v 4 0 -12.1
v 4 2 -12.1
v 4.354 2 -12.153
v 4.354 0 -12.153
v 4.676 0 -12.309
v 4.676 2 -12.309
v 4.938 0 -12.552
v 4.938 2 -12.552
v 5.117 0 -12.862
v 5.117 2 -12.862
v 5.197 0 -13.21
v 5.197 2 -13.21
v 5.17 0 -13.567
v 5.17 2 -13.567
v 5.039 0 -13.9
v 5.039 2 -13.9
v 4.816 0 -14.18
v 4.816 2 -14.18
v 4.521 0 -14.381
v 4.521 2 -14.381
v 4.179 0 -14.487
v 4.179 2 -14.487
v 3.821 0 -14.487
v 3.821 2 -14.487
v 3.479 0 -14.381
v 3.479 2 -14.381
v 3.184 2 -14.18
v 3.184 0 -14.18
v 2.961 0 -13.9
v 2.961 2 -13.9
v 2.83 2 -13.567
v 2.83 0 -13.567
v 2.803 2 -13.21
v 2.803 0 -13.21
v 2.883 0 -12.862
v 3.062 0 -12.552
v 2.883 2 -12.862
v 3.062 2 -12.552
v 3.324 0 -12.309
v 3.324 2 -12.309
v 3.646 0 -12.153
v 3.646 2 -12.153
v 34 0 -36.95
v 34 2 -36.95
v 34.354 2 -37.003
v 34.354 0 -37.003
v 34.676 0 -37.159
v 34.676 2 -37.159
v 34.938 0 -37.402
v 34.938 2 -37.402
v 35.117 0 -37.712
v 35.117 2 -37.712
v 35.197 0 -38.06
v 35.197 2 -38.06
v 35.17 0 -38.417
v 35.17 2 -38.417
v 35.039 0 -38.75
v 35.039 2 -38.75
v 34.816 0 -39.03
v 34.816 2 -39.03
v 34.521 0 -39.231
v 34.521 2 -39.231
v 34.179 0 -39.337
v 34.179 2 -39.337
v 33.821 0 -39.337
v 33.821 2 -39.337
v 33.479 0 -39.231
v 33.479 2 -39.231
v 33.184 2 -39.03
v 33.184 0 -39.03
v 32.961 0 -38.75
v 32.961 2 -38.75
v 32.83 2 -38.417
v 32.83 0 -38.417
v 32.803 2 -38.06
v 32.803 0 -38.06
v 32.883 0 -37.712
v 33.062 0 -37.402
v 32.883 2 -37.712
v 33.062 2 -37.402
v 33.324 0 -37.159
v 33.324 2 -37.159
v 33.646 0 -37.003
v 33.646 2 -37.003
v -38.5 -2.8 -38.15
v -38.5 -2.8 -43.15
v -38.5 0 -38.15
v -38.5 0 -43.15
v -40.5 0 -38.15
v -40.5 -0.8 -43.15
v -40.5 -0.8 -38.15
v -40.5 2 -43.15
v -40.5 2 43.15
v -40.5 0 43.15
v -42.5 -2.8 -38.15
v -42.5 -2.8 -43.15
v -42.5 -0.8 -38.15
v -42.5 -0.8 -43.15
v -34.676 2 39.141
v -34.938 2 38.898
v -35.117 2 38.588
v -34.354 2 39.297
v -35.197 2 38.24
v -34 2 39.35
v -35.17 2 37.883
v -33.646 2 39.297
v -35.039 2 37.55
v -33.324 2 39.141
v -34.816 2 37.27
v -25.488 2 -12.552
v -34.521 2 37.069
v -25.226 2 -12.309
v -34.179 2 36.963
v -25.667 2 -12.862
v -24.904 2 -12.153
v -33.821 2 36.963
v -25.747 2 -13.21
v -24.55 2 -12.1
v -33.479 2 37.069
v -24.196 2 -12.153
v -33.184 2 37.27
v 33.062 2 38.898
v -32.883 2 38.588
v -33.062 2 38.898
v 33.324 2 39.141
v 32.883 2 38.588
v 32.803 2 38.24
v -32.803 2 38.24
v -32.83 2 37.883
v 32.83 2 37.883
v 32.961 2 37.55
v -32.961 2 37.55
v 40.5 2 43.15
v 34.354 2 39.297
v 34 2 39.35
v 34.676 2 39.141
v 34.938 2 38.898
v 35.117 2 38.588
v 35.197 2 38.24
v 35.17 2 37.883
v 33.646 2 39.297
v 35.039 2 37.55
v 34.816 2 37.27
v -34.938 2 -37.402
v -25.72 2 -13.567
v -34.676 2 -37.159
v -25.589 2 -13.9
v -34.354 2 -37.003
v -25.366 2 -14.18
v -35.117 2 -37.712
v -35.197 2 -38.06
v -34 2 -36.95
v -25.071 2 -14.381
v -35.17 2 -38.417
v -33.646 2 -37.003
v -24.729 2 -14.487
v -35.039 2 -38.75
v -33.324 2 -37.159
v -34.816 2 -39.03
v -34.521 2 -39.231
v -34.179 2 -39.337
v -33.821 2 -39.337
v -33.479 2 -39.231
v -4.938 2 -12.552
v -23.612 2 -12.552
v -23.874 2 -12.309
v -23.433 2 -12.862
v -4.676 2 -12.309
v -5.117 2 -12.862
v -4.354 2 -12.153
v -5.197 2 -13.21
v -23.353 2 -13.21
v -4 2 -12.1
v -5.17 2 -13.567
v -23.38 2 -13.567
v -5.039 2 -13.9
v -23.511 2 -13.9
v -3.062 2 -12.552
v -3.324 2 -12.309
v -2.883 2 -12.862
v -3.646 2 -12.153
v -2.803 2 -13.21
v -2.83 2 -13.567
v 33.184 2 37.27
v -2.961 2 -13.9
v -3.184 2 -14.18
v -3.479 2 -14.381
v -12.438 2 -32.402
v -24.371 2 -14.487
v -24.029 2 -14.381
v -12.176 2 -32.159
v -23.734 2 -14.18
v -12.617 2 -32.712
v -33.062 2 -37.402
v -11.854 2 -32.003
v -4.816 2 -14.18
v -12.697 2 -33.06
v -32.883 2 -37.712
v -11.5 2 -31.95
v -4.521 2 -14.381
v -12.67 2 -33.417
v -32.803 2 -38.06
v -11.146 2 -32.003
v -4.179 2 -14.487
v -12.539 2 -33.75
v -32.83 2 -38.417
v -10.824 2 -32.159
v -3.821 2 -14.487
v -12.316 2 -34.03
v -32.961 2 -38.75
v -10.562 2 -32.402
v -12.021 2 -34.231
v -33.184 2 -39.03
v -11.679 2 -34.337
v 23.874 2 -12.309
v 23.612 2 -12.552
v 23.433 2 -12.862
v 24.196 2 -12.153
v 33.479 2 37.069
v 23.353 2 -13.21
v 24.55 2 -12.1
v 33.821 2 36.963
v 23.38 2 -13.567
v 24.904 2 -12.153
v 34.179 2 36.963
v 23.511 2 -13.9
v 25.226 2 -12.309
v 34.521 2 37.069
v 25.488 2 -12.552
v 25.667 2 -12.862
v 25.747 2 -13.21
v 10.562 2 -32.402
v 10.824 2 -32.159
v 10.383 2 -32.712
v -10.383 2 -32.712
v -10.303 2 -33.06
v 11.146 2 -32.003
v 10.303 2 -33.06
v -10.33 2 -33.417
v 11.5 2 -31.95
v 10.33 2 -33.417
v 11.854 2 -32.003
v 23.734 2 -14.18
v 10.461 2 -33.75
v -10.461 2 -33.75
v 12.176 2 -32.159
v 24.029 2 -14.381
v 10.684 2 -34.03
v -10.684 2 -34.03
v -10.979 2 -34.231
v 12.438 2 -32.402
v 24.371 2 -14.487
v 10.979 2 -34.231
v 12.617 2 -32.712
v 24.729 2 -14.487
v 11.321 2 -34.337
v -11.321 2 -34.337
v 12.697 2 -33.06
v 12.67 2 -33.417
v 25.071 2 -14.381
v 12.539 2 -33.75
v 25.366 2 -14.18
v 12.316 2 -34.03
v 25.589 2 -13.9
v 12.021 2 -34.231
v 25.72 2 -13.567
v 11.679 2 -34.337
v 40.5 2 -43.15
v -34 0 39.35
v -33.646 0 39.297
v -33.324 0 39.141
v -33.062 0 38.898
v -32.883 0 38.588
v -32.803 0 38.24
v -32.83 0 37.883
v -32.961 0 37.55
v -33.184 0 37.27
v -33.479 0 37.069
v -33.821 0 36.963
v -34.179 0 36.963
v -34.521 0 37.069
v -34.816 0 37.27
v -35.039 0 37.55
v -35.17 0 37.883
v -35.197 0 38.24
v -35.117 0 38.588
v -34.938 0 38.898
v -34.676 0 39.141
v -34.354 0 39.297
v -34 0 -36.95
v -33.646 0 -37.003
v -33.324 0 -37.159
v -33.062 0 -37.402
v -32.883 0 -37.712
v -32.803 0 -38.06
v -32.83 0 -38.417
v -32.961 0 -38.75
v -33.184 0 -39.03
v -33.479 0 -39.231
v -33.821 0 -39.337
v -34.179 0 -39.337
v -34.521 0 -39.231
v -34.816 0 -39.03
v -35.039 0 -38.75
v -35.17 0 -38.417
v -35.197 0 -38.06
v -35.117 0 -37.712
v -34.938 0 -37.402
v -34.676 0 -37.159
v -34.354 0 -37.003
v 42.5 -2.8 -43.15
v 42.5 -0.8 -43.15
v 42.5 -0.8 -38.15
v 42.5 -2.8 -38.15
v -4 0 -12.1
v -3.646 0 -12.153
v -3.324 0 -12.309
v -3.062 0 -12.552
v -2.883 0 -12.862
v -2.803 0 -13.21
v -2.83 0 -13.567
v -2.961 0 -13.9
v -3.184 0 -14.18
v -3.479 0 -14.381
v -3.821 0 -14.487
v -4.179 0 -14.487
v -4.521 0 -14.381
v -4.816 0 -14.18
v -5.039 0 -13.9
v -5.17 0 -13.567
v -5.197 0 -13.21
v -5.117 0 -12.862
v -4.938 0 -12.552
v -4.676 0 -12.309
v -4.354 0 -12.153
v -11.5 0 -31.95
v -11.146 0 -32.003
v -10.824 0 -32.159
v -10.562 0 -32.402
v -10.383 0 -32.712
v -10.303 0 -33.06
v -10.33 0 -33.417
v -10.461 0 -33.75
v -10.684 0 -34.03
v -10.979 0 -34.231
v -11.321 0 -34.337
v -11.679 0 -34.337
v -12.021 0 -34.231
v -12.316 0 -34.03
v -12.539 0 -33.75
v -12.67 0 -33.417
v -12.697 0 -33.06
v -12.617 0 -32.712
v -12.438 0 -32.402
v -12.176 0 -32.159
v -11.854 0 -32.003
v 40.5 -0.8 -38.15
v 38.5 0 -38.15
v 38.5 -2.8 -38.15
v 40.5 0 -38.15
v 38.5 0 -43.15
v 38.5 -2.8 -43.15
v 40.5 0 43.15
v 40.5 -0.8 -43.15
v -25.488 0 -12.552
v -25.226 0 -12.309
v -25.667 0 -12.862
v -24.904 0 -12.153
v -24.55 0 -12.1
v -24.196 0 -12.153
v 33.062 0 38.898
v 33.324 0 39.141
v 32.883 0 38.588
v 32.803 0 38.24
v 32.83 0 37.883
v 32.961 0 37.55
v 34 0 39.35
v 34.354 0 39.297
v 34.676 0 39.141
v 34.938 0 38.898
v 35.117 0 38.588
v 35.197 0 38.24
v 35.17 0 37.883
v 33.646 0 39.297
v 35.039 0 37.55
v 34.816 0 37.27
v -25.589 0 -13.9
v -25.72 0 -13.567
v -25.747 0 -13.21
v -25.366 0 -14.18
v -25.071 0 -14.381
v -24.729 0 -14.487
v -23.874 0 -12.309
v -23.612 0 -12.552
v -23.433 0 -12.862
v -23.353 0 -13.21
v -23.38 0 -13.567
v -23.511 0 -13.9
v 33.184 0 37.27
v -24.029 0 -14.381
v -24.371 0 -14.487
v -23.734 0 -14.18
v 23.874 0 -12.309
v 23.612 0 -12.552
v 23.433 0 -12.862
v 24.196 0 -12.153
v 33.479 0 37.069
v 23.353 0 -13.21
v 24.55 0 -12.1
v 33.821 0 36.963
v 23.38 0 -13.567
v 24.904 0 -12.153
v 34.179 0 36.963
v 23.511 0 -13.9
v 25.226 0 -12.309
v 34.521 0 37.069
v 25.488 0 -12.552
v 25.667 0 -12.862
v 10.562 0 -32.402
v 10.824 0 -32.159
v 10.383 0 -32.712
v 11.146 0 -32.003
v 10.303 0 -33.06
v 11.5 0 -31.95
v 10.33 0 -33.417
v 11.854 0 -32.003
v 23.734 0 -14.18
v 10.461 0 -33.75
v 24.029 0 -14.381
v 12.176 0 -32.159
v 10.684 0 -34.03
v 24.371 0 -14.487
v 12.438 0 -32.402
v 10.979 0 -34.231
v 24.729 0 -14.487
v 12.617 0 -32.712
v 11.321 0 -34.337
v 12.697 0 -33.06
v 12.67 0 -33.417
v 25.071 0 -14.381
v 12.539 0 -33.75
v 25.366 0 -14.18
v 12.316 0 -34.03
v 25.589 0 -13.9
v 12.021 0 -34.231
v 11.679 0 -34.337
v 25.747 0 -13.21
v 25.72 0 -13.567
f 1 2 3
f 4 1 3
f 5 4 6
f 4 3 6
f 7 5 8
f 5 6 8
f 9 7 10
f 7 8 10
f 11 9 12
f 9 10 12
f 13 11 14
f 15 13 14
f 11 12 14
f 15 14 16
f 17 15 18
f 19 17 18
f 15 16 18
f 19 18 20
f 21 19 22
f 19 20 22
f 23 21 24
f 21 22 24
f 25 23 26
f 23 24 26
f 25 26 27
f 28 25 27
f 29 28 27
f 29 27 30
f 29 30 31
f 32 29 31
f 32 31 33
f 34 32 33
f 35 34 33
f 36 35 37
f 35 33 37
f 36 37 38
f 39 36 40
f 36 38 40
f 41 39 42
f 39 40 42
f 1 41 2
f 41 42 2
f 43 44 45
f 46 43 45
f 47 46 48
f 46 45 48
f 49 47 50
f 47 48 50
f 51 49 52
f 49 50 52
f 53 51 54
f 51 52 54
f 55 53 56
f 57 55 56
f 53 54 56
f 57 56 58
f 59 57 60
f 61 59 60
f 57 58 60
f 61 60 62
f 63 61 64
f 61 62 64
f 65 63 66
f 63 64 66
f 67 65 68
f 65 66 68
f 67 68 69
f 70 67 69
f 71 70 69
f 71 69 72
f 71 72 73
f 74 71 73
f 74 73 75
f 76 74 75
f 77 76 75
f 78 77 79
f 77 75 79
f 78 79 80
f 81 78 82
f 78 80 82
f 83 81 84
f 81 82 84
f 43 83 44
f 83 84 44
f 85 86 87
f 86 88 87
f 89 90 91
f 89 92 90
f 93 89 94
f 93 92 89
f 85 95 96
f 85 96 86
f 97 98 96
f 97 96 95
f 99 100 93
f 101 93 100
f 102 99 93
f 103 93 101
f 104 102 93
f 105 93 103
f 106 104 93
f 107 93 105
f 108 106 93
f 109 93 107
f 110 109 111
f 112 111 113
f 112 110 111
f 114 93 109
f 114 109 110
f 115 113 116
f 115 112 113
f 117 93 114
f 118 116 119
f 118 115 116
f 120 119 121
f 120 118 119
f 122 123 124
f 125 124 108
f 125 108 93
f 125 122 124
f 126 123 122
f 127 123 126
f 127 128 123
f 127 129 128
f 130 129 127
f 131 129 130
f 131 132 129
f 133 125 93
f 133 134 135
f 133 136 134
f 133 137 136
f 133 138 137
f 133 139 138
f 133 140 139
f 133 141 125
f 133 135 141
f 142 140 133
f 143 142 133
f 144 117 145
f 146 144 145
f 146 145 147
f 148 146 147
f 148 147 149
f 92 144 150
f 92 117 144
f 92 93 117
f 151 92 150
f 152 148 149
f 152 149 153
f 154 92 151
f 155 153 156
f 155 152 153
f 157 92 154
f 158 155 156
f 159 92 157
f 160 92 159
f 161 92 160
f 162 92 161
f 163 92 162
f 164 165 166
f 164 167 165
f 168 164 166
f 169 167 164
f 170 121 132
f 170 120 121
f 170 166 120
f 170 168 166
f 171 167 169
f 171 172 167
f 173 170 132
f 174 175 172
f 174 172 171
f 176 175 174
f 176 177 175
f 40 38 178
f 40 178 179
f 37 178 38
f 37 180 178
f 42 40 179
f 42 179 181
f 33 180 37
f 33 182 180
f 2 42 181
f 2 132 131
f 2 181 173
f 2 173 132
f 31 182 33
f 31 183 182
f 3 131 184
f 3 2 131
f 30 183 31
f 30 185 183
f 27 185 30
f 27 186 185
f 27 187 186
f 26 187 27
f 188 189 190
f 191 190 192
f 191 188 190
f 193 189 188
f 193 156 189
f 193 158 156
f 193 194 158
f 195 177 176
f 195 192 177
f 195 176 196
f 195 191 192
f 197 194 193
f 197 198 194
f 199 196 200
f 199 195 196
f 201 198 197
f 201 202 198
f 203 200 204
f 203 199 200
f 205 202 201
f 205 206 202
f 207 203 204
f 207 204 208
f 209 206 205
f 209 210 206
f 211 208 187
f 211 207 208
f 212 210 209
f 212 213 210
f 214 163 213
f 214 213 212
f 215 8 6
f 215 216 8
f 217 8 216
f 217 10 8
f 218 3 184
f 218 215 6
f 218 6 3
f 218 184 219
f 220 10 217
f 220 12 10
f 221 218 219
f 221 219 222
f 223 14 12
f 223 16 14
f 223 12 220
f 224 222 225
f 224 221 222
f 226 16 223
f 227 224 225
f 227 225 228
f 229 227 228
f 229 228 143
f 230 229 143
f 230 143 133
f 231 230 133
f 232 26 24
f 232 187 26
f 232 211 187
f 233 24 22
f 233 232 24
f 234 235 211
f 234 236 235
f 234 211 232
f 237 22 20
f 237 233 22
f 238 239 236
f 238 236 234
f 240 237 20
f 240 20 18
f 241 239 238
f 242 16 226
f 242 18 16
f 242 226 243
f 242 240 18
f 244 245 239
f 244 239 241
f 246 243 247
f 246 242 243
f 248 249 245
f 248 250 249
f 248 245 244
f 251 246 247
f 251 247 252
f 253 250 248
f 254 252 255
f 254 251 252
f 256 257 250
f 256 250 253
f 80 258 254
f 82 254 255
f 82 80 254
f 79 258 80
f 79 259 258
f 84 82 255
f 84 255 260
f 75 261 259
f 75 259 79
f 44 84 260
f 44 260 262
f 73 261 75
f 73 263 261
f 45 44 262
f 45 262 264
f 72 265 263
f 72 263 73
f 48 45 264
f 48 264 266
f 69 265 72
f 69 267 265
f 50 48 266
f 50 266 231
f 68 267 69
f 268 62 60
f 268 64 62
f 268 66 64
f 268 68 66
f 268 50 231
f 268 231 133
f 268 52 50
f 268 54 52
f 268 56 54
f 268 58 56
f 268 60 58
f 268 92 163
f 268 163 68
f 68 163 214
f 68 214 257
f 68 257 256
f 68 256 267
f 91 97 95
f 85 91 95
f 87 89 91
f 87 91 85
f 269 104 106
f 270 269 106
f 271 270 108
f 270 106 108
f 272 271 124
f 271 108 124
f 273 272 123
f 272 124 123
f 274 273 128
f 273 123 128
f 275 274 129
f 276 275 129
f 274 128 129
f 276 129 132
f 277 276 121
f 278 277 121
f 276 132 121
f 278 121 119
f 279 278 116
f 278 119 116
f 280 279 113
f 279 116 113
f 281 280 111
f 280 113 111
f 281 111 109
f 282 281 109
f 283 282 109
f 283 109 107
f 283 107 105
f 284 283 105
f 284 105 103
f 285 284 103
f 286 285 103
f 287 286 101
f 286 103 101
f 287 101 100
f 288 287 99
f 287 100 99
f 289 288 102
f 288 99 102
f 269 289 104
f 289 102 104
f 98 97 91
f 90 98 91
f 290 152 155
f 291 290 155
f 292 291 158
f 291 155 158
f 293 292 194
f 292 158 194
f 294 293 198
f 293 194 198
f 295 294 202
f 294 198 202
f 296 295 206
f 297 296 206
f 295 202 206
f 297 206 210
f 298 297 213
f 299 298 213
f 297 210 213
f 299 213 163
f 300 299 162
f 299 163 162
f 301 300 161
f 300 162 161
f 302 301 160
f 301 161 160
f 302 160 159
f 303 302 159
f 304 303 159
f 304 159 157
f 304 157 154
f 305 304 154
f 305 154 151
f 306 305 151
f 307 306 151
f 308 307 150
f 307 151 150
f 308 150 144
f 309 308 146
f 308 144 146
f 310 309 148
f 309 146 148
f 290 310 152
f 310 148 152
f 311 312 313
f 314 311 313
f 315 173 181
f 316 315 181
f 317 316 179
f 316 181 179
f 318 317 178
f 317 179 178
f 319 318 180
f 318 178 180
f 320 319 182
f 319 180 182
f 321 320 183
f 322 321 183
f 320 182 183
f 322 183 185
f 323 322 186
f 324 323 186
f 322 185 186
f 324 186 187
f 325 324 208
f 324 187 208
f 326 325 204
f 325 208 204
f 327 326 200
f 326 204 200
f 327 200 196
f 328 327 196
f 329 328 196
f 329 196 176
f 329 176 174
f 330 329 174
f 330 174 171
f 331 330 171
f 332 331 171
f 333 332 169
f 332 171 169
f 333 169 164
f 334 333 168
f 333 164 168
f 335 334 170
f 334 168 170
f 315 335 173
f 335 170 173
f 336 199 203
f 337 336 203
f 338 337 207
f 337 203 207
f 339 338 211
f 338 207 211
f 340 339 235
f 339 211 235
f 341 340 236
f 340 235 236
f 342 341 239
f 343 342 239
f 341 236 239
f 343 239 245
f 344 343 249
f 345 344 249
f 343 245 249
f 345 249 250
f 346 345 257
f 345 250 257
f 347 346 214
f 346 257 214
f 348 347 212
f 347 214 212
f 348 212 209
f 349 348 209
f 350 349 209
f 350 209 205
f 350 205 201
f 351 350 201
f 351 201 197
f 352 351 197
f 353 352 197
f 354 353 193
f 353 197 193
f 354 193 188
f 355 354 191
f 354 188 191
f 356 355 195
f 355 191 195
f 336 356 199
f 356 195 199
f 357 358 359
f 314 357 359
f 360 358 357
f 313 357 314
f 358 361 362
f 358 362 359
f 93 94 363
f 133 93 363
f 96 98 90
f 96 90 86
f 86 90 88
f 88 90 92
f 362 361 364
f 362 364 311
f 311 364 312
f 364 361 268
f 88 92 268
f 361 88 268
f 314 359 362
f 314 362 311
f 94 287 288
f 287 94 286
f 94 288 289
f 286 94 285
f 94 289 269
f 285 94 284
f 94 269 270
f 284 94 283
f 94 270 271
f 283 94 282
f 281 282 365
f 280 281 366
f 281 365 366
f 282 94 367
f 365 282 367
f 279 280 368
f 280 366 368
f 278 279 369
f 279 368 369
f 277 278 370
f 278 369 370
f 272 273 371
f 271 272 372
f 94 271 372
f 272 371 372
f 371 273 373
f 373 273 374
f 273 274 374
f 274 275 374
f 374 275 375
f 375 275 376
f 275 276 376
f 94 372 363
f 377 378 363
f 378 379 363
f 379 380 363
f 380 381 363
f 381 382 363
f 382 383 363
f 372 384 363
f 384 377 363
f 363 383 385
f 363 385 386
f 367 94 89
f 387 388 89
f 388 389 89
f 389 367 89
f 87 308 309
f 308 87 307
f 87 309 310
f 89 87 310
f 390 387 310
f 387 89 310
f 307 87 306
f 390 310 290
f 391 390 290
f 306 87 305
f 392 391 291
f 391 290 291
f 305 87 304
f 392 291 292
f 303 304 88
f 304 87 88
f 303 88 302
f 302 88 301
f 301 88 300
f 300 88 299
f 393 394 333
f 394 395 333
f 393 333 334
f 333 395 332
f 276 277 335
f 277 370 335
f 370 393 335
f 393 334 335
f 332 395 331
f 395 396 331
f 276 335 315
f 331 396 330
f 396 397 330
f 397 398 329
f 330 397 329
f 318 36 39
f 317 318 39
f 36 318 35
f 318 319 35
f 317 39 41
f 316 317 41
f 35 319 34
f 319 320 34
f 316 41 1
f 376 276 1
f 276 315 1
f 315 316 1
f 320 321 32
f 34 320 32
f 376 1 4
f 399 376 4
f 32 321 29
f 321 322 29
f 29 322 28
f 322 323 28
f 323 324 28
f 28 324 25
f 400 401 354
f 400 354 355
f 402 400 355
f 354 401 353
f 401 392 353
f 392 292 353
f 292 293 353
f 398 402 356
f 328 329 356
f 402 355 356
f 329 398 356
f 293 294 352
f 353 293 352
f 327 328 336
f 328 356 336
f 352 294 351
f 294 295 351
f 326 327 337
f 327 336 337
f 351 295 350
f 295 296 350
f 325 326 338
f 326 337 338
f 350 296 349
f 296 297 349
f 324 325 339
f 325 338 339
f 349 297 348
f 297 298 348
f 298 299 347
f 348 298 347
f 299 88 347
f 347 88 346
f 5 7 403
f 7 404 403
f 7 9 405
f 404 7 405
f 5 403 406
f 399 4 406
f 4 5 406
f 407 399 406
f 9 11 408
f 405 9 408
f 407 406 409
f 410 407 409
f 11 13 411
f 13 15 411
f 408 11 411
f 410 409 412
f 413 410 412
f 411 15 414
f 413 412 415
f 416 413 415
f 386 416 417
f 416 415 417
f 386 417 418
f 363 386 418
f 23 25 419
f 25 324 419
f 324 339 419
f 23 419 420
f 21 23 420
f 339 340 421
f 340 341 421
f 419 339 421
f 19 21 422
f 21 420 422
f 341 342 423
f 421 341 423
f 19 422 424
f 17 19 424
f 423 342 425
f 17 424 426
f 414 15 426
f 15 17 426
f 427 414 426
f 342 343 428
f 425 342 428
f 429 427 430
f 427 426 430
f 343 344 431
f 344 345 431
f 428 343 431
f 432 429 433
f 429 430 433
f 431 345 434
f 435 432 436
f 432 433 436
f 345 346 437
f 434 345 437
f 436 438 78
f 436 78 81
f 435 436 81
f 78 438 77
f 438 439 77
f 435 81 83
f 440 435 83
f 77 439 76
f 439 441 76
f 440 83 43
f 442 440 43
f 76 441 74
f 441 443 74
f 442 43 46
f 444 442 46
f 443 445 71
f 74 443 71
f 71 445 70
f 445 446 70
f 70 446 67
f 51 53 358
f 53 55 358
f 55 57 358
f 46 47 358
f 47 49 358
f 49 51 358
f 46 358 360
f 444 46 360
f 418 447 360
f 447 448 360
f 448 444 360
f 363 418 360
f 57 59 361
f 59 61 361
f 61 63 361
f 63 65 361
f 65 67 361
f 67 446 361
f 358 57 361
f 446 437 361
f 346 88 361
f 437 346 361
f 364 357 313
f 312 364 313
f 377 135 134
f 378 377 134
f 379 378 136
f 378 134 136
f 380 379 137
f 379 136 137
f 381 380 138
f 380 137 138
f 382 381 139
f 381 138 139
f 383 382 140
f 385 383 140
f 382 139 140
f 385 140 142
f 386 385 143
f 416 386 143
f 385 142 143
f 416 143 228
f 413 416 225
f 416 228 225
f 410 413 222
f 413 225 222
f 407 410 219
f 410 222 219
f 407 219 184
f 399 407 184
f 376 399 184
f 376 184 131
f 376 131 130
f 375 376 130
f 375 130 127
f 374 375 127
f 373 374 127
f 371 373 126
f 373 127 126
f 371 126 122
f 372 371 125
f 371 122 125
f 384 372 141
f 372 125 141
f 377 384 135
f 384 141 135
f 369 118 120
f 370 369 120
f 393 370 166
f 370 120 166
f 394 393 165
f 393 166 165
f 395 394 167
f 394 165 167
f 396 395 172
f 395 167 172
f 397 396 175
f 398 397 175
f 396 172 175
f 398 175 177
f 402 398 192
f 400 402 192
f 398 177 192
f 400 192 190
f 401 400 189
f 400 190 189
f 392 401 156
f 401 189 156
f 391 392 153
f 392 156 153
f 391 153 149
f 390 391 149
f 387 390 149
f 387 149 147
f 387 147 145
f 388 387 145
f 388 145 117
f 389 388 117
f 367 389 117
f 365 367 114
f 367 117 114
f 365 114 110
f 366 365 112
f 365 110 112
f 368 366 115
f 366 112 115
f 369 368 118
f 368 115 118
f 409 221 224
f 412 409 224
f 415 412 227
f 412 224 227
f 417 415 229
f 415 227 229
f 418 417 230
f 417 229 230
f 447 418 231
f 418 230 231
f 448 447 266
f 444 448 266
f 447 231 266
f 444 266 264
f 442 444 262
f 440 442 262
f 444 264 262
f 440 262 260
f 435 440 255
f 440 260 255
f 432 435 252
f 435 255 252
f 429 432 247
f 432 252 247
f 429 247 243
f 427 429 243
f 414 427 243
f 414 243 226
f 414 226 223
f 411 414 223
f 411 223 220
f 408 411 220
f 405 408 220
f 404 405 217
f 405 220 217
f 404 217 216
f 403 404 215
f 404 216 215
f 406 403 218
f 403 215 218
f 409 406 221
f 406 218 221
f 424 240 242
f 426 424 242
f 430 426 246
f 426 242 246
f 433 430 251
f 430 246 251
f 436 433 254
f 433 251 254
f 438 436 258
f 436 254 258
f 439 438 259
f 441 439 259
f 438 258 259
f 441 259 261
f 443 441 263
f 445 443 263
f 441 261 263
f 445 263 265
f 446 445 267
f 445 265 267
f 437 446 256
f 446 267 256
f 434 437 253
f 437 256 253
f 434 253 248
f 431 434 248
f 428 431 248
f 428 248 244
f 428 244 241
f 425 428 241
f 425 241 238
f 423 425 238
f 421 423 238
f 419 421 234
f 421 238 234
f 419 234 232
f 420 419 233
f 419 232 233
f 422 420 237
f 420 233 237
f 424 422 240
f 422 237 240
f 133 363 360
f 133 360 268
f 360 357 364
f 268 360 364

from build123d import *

# Parameters (mm, degrees)
SKETCH_1_W          = 81
SKETCH_1_H          = 86.3
EXTRUDE_1_DEPTH     = 2
SKETCH_2_R          = 1.2
CUT_EXTRUDE_1_DEPTH = 2
SKETCH_3_W          = 2
SKETCH_3_H          = 5
EXTRUDE_2_DEPTH     = 0.8
SKETCH_4_W          = 4
SKETCH_4_H          = 5
EXTRUDE_3_DEPTH     = 2


with BuildPart() as part:
    # ｽｹｯﾁ1 → ﾎﾞｽ - 押し出し1 (new body)
    with BuildSketch(Plane(origin=(0, 0, 0), x_dir=(1, 0, 0), z_dir=(0, 1, 0))):
        Rectangle(SKETCH_1_W, SKETCH_1_H)
    extrude(amount=EXTRUDE_1_DEPTH)

    # ｽｹｯﾁ2 → ｶｯﾄ - 押し出し1 (cut)
    with BuildSketch(Plane(origin=(0, 2, 0), x_dir=(1, 0, 0), z_dir=(0, 1, 0))):
        with Locations(Location((-34, -38.15, 0), (0, 0, 270))):
            Circle(SKETCH_2_R)
        with Locations(Location((-34, 38.15, 0), (0, 0, 270))):
            Circle(SKETCH_2_R)
        with Locations(Location((34, 38.15, 0), (0, 0, 270))):
            Circle(SKETCH_2_R)
        with Locations(Location((34, -38.15, 0), (0, 0, 270))):
            Circle(SKETCH_2_R)
        with Locations(Location((-24.55, 13.3, 0), (0, 0, 270))):
            Circle(SKETCH_2_R)
        with Locations(Location((24.55, 13.3, 0), (0, 0, 270))):
            Circle(SKETCH_2_R)
        with Locations(Location((-11.5, 33.15, 0), (0, 0, 270))):
            Circle(SKETCH_2_R)
        with Locations(Location((11.5, 33.15, 0), (0, 0, 270))):
            Circle(SKETCH_2_R)
        with Locations(Location((-4, 13.3, 0), (0, 0, 270))):
            Circle(SKETCH_2_R)
        with Locations(Location((4, 13.3, 0), (0, 0, 270))):
            Circle(SKETCH_2_R)
    extrude(amount=-CUT_EXTRUDE_1_DEPTH, mode=Mode.SUBTRACT)

    # ｽｹｯﾁ3 → ﾎﾞｽ - 押し出し2 (add)
    with BuildSketch(Plane.XZ):
        with Locations((-39.5, -40.65)):
            Rectangle(SKETCH_3_W, SKETCH_3_H)
        with Locations((39.5, -40.65)):
            Rectangle(SKETCH_3_W, SKETCH_3_H)
    extrude(amount=EXTRUDE_2_DEPTH)

    # ｽｹｯﾁ4 → ﾎﾞｽ - 押し出し3 (add)
    with BuildSketch(Plane.XZ.offset(0.8)):
        with Locations((-40.5, -40.65)):
            Rectangle(SKETCH_4_W, SKETCH_4_H)
        with Locations((40.5, -40.65)):
            Rectangle(SKETCH_4_W, SKETCH_4_H)
    extrude(amount=EXTRUDE_3_DEPTH)


solid = part.part
